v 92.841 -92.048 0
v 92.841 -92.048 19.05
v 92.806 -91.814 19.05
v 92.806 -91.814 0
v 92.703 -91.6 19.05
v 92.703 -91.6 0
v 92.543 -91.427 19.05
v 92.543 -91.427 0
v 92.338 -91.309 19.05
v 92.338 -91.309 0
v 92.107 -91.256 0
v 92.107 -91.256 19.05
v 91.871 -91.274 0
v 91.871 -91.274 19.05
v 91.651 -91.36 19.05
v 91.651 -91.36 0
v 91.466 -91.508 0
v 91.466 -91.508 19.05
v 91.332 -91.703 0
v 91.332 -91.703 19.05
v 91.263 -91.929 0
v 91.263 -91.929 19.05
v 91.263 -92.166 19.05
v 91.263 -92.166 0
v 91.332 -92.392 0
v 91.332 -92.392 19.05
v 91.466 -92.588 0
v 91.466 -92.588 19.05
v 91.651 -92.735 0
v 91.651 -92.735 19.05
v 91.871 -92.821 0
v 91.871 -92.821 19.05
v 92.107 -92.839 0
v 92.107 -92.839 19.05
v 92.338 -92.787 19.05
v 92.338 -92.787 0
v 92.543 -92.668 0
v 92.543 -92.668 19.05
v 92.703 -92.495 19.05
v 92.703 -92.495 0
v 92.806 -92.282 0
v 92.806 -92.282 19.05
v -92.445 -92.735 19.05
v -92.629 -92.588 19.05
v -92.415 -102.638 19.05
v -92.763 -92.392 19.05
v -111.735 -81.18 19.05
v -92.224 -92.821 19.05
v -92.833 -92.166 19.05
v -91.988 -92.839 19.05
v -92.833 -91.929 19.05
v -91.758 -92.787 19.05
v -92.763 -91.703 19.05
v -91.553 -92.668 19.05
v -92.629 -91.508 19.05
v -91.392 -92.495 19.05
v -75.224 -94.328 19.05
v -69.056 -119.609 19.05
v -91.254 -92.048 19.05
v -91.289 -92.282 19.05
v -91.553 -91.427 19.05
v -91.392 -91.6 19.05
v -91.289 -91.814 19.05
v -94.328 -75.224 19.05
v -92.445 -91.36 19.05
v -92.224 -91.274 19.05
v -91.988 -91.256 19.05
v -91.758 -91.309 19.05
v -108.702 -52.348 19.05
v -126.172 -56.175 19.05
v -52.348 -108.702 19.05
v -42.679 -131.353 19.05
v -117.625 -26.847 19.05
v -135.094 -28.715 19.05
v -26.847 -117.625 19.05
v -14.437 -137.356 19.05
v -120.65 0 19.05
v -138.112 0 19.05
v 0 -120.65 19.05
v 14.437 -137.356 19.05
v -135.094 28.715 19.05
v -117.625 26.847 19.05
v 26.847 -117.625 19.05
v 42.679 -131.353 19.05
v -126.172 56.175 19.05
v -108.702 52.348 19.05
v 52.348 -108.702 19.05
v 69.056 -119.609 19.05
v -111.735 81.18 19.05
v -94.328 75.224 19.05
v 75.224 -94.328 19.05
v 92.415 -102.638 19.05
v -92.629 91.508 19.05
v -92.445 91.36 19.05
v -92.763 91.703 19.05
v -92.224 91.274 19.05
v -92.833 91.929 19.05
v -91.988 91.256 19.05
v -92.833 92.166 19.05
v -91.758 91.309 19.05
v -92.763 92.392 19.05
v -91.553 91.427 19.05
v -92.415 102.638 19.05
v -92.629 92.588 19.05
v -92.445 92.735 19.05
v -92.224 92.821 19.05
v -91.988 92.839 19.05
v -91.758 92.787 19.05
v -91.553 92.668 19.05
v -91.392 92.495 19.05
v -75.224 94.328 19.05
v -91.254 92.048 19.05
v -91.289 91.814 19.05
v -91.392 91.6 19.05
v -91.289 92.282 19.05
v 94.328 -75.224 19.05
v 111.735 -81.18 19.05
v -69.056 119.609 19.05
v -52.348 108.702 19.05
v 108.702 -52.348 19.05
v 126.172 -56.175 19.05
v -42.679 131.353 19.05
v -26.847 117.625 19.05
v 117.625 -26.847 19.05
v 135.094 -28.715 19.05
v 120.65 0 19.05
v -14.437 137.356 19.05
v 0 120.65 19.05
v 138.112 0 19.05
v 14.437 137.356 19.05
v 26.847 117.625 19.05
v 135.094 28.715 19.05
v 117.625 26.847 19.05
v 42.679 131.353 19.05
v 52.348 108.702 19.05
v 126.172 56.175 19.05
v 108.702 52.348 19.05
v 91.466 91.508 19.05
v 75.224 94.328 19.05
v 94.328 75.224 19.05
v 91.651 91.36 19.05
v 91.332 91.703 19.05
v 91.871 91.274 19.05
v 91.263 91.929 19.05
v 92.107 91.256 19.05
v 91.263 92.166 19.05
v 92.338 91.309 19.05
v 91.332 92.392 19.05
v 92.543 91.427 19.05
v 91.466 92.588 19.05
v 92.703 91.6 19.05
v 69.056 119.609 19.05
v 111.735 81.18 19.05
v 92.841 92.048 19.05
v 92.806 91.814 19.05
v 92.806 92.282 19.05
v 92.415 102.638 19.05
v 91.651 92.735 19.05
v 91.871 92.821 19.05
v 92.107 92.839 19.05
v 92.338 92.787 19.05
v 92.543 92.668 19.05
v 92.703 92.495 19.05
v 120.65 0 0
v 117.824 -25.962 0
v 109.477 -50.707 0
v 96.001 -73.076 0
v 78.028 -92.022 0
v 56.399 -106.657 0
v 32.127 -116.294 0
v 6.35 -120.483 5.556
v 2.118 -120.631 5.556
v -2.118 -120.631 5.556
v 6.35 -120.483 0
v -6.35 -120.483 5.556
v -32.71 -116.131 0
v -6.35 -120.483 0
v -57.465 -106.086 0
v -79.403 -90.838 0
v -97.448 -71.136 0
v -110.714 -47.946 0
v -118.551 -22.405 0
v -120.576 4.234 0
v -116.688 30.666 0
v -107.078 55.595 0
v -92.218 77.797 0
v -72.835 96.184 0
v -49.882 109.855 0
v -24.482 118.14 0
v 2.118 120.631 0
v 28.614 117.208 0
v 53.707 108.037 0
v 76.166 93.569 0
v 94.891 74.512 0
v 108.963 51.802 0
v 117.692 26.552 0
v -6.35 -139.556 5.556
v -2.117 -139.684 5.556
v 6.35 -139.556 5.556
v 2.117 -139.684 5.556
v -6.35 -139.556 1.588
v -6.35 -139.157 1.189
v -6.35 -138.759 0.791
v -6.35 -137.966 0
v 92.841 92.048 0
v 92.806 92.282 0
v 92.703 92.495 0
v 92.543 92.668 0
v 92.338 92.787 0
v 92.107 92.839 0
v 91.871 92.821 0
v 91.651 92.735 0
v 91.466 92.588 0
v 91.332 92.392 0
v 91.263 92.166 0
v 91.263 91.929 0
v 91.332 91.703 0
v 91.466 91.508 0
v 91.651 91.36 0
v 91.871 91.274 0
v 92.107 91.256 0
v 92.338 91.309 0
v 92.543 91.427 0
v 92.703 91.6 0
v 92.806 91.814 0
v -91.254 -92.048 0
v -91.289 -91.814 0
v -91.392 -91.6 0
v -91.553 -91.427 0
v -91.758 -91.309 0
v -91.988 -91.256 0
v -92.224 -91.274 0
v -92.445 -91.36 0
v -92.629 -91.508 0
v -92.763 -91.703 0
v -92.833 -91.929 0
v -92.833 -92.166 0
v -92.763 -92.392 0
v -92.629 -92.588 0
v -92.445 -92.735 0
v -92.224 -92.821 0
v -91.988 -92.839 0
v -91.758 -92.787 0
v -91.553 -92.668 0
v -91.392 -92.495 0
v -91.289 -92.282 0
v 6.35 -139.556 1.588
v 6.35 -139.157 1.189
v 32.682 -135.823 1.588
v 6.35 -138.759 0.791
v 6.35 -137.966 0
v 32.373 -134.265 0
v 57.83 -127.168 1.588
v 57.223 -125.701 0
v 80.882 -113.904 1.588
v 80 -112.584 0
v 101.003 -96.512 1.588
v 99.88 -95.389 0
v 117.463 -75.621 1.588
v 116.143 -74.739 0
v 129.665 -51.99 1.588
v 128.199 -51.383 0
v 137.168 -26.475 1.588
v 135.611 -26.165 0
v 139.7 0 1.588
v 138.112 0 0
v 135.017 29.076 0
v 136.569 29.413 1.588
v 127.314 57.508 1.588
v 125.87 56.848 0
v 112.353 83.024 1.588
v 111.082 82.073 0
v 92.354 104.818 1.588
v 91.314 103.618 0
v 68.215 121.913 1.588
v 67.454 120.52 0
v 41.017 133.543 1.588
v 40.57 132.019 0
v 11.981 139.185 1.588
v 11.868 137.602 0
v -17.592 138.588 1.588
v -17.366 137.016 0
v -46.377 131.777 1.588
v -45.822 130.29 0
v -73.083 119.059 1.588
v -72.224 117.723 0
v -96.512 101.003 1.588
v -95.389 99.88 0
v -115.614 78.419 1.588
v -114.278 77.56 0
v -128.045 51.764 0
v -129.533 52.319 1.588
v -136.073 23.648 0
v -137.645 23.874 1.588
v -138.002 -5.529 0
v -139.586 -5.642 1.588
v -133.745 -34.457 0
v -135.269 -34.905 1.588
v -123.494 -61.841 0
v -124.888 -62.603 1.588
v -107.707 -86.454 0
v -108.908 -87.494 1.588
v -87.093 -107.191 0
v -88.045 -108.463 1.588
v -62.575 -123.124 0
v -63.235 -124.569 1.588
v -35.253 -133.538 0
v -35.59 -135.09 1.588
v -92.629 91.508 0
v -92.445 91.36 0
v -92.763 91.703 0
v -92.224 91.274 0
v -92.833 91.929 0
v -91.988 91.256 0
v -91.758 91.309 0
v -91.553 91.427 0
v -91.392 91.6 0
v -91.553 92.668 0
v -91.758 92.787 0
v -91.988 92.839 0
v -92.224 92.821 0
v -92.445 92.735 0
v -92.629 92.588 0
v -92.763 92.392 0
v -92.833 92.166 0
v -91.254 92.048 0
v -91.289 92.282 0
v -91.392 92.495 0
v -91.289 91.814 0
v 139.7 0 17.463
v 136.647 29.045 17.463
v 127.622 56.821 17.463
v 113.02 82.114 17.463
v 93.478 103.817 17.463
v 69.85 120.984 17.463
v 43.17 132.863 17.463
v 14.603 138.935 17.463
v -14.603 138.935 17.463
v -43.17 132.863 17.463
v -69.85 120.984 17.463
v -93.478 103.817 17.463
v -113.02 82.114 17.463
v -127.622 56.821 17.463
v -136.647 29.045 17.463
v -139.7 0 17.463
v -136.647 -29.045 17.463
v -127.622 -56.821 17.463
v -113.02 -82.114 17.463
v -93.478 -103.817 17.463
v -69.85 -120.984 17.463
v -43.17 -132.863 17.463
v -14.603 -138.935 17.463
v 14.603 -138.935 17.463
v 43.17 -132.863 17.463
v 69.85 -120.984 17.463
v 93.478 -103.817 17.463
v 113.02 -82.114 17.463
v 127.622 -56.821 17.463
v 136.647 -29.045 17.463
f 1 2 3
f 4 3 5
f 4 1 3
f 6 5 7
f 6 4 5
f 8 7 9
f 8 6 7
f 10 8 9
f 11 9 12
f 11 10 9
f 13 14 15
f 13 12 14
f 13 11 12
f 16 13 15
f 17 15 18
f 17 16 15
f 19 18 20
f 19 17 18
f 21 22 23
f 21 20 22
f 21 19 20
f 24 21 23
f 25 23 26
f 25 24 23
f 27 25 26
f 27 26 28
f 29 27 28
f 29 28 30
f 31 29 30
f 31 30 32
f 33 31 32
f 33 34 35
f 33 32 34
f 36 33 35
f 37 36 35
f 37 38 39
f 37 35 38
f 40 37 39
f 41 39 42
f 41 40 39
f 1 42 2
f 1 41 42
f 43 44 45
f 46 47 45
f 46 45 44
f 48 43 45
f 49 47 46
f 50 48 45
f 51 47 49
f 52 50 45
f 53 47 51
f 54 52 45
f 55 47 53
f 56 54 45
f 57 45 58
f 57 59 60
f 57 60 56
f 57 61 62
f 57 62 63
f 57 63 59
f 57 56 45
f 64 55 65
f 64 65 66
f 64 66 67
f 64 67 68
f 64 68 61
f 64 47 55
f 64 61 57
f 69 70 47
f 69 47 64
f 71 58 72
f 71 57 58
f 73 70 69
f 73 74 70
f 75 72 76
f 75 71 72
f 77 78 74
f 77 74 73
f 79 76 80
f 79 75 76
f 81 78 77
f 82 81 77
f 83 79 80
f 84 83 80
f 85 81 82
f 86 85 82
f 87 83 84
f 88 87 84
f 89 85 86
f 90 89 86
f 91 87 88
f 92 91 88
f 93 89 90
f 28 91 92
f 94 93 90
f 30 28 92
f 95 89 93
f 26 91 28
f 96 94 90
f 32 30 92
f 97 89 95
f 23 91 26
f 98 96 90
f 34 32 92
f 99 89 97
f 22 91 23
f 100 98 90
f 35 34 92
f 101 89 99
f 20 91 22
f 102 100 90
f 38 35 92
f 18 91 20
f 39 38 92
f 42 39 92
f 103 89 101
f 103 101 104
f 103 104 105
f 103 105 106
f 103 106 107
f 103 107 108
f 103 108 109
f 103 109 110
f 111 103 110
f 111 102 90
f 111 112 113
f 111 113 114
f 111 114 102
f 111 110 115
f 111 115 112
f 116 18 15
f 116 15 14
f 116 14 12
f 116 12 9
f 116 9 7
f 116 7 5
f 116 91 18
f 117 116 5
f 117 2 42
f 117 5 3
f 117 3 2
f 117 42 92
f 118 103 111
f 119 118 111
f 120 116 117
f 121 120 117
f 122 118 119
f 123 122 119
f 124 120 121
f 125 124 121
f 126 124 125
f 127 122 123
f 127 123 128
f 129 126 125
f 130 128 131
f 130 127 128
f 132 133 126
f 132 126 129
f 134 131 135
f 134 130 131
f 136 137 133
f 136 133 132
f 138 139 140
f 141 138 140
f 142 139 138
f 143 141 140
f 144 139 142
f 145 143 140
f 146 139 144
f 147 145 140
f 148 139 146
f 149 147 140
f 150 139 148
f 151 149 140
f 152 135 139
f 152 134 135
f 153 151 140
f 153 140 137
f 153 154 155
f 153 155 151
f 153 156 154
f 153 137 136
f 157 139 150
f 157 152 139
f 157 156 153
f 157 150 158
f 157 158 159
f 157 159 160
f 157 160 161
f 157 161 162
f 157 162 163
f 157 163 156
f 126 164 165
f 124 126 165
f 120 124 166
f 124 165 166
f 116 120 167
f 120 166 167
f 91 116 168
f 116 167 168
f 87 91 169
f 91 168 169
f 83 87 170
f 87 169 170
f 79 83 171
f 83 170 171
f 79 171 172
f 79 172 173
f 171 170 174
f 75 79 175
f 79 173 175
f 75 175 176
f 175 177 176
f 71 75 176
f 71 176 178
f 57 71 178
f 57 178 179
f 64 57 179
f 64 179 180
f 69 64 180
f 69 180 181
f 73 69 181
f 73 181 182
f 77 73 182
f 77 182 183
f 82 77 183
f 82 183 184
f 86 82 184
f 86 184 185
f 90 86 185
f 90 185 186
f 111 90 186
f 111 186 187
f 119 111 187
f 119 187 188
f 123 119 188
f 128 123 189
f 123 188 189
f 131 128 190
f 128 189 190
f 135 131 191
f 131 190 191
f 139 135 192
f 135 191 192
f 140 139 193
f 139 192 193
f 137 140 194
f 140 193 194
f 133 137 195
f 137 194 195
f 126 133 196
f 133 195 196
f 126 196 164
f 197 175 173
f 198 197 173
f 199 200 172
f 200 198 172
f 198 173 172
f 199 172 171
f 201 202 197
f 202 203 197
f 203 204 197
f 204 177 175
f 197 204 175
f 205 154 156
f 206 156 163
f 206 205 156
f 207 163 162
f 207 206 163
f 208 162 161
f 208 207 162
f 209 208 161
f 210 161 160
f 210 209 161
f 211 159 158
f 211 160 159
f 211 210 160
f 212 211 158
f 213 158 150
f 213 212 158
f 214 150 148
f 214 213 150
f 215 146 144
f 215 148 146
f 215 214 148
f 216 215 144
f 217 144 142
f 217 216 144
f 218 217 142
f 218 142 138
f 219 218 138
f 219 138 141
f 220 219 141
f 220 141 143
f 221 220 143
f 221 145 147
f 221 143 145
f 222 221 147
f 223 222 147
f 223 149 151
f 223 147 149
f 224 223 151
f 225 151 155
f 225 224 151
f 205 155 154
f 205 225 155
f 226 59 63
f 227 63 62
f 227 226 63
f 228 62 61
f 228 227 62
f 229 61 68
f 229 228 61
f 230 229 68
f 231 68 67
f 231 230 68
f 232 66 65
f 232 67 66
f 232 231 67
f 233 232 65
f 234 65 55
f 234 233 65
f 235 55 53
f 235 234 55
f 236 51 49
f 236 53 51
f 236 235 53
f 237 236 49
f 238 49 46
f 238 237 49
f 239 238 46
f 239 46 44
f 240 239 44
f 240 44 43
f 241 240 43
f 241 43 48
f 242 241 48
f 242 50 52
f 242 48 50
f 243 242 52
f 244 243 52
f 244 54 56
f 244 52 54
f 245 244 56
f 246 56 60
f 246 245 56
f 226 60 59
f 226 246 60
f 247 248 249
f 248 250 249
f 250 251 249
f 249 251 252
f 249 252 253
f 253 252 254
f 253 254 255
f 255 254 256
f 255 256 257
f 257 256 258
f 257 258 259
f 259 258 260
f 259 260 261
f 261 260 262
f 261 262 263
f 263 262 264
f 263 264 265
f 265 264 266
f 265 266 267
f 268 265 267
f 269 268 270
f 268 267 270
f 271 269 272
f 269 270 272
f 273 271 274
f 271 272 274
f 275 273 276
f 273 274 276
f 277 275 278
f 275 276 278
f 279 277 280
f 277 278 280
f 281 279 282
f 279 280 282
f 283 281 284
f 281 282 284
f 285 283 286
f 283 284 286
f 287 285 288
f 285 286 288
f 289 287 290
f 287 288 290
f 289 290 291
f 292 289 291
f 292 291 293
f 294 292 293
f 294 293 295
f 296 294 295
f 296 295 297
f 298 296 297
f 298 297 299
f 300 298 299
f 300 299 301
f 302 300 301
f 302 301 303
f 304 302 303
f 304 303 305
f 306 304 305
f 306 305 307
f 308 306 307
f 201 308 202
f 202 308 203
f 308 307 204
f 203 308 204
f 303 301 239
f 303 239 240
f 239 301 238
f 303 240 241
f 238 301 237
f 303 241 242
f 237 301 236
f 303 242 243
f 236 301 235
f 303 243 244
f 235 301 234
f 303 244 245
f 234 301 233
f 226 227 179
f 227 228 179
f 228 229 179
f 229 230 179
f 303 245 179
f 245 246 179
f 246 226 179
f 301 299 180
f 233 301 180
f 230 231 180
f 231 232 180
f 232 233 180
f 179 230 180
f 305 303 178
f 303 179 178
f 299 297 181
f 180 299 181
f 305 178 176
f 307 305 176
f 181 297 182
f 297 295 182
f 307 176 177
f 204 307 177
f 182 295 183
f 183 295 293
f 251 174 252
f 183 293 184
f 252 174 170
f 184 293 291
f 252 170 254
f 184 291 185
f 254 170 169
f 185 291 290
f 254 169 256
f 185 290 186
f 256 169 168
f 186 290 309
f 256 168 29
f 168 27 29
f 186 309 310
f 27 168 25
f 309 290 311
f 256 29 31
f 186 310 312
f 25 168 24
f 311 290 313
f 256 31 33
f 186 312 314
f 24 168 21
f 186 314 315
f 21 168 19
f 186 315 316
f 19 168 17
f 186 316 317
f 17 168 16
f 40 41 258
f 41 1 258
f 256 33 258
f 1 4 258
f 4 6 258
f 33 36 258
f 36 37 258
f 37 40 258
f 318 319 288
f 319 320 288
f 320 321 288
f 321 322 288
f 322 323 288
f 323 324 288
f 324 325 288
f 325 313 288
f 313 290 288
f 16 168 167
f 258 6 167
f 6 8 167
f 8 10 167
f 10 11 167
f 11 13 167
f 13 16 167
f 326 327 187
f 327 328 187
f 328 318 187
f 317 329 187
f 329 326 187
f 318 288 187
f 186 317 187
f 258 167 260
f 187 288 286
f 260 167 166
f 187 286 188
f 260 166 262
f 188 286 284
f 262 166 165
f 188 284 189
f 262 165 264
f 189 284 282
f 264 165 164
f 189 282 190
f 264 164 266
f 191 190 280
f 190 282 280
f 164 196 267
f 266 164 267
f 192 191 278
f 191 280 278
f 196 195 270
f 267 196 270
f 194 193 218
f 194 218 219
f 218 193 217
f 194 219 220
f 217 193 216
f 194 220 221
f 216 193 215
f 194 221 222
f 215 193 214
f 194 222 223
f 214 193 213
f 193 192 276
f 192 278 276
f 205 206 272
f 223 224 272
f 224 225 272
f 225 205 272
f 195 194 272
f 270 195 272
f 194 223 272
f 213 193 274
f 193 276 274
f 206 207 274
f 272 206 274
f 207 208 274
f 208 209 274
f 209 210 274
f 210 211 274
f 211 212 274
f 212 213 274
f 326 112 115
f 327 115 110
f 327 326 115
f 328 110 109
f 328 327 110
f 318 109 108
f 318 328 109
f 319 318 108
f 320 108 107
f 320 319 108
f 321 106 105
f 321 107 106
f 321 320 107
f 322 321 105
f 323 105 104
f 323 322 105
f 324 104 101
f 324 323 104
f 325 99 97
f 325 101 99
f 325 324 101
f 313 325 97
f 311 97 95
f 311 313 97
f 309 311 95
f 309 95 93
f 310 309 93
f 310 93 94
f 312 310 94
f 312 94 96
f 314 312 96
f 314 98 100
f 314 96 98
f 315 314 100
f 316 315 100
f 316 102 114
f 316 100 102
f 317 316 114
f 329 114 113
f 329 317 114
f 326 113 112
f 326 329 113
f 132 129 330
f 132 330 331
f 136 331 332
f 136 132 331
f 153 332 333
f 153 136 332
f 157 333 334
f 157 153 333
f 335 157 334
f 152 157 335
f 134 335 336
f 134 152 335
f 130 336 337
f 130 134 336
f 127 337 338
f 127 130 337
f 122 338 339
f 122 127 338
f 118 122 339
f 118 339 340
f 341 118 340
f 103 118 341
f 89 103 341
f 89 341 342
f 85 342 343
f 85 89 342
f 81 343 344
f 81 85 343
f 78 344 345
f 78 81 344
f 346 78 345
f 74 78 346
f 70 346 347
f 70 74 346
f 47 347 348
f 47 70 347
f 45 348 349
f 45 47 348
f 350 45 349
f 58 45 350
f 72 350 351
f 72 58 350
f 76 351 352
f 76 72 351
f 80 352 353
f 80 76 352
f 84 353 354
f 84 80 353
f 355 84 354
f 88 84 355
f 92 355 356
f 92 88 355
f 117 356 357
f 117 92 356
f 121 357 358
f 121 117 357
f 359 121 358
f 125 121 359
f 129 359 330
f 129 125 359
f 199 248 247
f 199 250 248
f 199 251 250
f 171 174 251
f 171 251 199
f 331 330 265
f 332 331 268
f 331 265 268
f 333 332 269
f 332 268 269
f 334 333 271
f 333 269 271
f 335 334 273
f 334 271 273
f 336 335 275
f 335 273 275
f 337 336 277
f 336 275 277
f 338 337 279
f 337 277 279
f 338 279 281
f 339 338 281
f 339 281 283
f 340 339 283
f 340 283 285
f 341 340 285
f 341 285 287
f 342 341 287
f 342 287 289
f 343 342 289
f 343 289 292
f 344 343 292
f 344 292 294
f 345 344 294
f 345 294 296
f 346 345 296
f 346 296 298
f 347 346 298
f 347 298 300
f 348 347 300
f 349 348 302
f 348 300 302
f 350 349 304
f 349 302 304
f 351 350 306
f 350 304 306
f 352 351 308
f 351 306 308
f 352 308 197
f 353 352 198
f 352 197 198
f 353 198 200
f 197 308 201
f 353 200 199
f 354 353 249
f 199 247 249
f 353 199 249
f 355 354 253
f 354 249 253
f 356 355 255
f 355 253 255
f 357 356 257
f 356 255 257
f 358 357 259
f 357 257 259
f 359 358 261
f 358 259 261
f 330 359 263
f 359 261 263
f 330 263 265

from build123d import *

# Parameters (mm, degrees)
F2_R      = 139.7
F3_DEPTH  = 19.05
F4_SIZE   = 1.5875
F5_R      = 120.65
F6_DEPTH  = 19.051
F7_W      = 12.7
F7_H      = 5.55625
F8_DEPTH  = 139.701
F9_R      = 0.79375
F10_DEPTH = 19.051


# Not quite as in the source:
# - a variable given as a bare number and used for a length is read in inches; the dataset says mm whatever the document's units were


with BuildPart() as f3:
    # F2 (on Top) → F3 (new body)
    with BuildSketch(Plane.XY):
        Circle(F2_R)
    extrude(amount=F3_DEPTH)

    # F4
    f4_edges = [f3.edges().sort_by_distance(p)[0] for p in [
        (-139.7, 0, 19.05),
        (-139.7, 0, 0),
    ]]
    chamfer(f4_edges, length=F4_SIZE)

    # F5 (on face) → F6 (cut, through all)
    with BuildSketch(Plane(origin=(0, 0, 0), x_dir=(1, 0, 0), z_dir=(0, 0, -1))):
        Circle(F5_R)
    extrude(amount=-F6_DEPTH, mode=Mode.SUBTRACT)

    # F7 (on Front) → F8 (cut, through all)
    with BuildSketch(Plane.XZ):
        with Locations((0, 2.778125)):
            Rectangle(F7_W, F7_H)
    extrude(amount=F8_DEPTH, mode=Mode.SUBTRACT)

    # F9 (on Top) → F10 (cut, through all)
    with BuildSketch(Plane.XY):
        with Locations((92.047625241, -92.047625241)):
            Circle(F9_R)
        with Locations((-92.047625241, -92.047625241)):
            Circle(F9_R)
        with Locations((-92.047625241, 92.047625241)):
            Circle(F9_R)
        with Locations((92.047625241, 92.047625241)):
            Circle(F9_R)
    extrude(amount=F10_DEPTH, mode=Mode.SUBTRACT)


solid = f3.part
